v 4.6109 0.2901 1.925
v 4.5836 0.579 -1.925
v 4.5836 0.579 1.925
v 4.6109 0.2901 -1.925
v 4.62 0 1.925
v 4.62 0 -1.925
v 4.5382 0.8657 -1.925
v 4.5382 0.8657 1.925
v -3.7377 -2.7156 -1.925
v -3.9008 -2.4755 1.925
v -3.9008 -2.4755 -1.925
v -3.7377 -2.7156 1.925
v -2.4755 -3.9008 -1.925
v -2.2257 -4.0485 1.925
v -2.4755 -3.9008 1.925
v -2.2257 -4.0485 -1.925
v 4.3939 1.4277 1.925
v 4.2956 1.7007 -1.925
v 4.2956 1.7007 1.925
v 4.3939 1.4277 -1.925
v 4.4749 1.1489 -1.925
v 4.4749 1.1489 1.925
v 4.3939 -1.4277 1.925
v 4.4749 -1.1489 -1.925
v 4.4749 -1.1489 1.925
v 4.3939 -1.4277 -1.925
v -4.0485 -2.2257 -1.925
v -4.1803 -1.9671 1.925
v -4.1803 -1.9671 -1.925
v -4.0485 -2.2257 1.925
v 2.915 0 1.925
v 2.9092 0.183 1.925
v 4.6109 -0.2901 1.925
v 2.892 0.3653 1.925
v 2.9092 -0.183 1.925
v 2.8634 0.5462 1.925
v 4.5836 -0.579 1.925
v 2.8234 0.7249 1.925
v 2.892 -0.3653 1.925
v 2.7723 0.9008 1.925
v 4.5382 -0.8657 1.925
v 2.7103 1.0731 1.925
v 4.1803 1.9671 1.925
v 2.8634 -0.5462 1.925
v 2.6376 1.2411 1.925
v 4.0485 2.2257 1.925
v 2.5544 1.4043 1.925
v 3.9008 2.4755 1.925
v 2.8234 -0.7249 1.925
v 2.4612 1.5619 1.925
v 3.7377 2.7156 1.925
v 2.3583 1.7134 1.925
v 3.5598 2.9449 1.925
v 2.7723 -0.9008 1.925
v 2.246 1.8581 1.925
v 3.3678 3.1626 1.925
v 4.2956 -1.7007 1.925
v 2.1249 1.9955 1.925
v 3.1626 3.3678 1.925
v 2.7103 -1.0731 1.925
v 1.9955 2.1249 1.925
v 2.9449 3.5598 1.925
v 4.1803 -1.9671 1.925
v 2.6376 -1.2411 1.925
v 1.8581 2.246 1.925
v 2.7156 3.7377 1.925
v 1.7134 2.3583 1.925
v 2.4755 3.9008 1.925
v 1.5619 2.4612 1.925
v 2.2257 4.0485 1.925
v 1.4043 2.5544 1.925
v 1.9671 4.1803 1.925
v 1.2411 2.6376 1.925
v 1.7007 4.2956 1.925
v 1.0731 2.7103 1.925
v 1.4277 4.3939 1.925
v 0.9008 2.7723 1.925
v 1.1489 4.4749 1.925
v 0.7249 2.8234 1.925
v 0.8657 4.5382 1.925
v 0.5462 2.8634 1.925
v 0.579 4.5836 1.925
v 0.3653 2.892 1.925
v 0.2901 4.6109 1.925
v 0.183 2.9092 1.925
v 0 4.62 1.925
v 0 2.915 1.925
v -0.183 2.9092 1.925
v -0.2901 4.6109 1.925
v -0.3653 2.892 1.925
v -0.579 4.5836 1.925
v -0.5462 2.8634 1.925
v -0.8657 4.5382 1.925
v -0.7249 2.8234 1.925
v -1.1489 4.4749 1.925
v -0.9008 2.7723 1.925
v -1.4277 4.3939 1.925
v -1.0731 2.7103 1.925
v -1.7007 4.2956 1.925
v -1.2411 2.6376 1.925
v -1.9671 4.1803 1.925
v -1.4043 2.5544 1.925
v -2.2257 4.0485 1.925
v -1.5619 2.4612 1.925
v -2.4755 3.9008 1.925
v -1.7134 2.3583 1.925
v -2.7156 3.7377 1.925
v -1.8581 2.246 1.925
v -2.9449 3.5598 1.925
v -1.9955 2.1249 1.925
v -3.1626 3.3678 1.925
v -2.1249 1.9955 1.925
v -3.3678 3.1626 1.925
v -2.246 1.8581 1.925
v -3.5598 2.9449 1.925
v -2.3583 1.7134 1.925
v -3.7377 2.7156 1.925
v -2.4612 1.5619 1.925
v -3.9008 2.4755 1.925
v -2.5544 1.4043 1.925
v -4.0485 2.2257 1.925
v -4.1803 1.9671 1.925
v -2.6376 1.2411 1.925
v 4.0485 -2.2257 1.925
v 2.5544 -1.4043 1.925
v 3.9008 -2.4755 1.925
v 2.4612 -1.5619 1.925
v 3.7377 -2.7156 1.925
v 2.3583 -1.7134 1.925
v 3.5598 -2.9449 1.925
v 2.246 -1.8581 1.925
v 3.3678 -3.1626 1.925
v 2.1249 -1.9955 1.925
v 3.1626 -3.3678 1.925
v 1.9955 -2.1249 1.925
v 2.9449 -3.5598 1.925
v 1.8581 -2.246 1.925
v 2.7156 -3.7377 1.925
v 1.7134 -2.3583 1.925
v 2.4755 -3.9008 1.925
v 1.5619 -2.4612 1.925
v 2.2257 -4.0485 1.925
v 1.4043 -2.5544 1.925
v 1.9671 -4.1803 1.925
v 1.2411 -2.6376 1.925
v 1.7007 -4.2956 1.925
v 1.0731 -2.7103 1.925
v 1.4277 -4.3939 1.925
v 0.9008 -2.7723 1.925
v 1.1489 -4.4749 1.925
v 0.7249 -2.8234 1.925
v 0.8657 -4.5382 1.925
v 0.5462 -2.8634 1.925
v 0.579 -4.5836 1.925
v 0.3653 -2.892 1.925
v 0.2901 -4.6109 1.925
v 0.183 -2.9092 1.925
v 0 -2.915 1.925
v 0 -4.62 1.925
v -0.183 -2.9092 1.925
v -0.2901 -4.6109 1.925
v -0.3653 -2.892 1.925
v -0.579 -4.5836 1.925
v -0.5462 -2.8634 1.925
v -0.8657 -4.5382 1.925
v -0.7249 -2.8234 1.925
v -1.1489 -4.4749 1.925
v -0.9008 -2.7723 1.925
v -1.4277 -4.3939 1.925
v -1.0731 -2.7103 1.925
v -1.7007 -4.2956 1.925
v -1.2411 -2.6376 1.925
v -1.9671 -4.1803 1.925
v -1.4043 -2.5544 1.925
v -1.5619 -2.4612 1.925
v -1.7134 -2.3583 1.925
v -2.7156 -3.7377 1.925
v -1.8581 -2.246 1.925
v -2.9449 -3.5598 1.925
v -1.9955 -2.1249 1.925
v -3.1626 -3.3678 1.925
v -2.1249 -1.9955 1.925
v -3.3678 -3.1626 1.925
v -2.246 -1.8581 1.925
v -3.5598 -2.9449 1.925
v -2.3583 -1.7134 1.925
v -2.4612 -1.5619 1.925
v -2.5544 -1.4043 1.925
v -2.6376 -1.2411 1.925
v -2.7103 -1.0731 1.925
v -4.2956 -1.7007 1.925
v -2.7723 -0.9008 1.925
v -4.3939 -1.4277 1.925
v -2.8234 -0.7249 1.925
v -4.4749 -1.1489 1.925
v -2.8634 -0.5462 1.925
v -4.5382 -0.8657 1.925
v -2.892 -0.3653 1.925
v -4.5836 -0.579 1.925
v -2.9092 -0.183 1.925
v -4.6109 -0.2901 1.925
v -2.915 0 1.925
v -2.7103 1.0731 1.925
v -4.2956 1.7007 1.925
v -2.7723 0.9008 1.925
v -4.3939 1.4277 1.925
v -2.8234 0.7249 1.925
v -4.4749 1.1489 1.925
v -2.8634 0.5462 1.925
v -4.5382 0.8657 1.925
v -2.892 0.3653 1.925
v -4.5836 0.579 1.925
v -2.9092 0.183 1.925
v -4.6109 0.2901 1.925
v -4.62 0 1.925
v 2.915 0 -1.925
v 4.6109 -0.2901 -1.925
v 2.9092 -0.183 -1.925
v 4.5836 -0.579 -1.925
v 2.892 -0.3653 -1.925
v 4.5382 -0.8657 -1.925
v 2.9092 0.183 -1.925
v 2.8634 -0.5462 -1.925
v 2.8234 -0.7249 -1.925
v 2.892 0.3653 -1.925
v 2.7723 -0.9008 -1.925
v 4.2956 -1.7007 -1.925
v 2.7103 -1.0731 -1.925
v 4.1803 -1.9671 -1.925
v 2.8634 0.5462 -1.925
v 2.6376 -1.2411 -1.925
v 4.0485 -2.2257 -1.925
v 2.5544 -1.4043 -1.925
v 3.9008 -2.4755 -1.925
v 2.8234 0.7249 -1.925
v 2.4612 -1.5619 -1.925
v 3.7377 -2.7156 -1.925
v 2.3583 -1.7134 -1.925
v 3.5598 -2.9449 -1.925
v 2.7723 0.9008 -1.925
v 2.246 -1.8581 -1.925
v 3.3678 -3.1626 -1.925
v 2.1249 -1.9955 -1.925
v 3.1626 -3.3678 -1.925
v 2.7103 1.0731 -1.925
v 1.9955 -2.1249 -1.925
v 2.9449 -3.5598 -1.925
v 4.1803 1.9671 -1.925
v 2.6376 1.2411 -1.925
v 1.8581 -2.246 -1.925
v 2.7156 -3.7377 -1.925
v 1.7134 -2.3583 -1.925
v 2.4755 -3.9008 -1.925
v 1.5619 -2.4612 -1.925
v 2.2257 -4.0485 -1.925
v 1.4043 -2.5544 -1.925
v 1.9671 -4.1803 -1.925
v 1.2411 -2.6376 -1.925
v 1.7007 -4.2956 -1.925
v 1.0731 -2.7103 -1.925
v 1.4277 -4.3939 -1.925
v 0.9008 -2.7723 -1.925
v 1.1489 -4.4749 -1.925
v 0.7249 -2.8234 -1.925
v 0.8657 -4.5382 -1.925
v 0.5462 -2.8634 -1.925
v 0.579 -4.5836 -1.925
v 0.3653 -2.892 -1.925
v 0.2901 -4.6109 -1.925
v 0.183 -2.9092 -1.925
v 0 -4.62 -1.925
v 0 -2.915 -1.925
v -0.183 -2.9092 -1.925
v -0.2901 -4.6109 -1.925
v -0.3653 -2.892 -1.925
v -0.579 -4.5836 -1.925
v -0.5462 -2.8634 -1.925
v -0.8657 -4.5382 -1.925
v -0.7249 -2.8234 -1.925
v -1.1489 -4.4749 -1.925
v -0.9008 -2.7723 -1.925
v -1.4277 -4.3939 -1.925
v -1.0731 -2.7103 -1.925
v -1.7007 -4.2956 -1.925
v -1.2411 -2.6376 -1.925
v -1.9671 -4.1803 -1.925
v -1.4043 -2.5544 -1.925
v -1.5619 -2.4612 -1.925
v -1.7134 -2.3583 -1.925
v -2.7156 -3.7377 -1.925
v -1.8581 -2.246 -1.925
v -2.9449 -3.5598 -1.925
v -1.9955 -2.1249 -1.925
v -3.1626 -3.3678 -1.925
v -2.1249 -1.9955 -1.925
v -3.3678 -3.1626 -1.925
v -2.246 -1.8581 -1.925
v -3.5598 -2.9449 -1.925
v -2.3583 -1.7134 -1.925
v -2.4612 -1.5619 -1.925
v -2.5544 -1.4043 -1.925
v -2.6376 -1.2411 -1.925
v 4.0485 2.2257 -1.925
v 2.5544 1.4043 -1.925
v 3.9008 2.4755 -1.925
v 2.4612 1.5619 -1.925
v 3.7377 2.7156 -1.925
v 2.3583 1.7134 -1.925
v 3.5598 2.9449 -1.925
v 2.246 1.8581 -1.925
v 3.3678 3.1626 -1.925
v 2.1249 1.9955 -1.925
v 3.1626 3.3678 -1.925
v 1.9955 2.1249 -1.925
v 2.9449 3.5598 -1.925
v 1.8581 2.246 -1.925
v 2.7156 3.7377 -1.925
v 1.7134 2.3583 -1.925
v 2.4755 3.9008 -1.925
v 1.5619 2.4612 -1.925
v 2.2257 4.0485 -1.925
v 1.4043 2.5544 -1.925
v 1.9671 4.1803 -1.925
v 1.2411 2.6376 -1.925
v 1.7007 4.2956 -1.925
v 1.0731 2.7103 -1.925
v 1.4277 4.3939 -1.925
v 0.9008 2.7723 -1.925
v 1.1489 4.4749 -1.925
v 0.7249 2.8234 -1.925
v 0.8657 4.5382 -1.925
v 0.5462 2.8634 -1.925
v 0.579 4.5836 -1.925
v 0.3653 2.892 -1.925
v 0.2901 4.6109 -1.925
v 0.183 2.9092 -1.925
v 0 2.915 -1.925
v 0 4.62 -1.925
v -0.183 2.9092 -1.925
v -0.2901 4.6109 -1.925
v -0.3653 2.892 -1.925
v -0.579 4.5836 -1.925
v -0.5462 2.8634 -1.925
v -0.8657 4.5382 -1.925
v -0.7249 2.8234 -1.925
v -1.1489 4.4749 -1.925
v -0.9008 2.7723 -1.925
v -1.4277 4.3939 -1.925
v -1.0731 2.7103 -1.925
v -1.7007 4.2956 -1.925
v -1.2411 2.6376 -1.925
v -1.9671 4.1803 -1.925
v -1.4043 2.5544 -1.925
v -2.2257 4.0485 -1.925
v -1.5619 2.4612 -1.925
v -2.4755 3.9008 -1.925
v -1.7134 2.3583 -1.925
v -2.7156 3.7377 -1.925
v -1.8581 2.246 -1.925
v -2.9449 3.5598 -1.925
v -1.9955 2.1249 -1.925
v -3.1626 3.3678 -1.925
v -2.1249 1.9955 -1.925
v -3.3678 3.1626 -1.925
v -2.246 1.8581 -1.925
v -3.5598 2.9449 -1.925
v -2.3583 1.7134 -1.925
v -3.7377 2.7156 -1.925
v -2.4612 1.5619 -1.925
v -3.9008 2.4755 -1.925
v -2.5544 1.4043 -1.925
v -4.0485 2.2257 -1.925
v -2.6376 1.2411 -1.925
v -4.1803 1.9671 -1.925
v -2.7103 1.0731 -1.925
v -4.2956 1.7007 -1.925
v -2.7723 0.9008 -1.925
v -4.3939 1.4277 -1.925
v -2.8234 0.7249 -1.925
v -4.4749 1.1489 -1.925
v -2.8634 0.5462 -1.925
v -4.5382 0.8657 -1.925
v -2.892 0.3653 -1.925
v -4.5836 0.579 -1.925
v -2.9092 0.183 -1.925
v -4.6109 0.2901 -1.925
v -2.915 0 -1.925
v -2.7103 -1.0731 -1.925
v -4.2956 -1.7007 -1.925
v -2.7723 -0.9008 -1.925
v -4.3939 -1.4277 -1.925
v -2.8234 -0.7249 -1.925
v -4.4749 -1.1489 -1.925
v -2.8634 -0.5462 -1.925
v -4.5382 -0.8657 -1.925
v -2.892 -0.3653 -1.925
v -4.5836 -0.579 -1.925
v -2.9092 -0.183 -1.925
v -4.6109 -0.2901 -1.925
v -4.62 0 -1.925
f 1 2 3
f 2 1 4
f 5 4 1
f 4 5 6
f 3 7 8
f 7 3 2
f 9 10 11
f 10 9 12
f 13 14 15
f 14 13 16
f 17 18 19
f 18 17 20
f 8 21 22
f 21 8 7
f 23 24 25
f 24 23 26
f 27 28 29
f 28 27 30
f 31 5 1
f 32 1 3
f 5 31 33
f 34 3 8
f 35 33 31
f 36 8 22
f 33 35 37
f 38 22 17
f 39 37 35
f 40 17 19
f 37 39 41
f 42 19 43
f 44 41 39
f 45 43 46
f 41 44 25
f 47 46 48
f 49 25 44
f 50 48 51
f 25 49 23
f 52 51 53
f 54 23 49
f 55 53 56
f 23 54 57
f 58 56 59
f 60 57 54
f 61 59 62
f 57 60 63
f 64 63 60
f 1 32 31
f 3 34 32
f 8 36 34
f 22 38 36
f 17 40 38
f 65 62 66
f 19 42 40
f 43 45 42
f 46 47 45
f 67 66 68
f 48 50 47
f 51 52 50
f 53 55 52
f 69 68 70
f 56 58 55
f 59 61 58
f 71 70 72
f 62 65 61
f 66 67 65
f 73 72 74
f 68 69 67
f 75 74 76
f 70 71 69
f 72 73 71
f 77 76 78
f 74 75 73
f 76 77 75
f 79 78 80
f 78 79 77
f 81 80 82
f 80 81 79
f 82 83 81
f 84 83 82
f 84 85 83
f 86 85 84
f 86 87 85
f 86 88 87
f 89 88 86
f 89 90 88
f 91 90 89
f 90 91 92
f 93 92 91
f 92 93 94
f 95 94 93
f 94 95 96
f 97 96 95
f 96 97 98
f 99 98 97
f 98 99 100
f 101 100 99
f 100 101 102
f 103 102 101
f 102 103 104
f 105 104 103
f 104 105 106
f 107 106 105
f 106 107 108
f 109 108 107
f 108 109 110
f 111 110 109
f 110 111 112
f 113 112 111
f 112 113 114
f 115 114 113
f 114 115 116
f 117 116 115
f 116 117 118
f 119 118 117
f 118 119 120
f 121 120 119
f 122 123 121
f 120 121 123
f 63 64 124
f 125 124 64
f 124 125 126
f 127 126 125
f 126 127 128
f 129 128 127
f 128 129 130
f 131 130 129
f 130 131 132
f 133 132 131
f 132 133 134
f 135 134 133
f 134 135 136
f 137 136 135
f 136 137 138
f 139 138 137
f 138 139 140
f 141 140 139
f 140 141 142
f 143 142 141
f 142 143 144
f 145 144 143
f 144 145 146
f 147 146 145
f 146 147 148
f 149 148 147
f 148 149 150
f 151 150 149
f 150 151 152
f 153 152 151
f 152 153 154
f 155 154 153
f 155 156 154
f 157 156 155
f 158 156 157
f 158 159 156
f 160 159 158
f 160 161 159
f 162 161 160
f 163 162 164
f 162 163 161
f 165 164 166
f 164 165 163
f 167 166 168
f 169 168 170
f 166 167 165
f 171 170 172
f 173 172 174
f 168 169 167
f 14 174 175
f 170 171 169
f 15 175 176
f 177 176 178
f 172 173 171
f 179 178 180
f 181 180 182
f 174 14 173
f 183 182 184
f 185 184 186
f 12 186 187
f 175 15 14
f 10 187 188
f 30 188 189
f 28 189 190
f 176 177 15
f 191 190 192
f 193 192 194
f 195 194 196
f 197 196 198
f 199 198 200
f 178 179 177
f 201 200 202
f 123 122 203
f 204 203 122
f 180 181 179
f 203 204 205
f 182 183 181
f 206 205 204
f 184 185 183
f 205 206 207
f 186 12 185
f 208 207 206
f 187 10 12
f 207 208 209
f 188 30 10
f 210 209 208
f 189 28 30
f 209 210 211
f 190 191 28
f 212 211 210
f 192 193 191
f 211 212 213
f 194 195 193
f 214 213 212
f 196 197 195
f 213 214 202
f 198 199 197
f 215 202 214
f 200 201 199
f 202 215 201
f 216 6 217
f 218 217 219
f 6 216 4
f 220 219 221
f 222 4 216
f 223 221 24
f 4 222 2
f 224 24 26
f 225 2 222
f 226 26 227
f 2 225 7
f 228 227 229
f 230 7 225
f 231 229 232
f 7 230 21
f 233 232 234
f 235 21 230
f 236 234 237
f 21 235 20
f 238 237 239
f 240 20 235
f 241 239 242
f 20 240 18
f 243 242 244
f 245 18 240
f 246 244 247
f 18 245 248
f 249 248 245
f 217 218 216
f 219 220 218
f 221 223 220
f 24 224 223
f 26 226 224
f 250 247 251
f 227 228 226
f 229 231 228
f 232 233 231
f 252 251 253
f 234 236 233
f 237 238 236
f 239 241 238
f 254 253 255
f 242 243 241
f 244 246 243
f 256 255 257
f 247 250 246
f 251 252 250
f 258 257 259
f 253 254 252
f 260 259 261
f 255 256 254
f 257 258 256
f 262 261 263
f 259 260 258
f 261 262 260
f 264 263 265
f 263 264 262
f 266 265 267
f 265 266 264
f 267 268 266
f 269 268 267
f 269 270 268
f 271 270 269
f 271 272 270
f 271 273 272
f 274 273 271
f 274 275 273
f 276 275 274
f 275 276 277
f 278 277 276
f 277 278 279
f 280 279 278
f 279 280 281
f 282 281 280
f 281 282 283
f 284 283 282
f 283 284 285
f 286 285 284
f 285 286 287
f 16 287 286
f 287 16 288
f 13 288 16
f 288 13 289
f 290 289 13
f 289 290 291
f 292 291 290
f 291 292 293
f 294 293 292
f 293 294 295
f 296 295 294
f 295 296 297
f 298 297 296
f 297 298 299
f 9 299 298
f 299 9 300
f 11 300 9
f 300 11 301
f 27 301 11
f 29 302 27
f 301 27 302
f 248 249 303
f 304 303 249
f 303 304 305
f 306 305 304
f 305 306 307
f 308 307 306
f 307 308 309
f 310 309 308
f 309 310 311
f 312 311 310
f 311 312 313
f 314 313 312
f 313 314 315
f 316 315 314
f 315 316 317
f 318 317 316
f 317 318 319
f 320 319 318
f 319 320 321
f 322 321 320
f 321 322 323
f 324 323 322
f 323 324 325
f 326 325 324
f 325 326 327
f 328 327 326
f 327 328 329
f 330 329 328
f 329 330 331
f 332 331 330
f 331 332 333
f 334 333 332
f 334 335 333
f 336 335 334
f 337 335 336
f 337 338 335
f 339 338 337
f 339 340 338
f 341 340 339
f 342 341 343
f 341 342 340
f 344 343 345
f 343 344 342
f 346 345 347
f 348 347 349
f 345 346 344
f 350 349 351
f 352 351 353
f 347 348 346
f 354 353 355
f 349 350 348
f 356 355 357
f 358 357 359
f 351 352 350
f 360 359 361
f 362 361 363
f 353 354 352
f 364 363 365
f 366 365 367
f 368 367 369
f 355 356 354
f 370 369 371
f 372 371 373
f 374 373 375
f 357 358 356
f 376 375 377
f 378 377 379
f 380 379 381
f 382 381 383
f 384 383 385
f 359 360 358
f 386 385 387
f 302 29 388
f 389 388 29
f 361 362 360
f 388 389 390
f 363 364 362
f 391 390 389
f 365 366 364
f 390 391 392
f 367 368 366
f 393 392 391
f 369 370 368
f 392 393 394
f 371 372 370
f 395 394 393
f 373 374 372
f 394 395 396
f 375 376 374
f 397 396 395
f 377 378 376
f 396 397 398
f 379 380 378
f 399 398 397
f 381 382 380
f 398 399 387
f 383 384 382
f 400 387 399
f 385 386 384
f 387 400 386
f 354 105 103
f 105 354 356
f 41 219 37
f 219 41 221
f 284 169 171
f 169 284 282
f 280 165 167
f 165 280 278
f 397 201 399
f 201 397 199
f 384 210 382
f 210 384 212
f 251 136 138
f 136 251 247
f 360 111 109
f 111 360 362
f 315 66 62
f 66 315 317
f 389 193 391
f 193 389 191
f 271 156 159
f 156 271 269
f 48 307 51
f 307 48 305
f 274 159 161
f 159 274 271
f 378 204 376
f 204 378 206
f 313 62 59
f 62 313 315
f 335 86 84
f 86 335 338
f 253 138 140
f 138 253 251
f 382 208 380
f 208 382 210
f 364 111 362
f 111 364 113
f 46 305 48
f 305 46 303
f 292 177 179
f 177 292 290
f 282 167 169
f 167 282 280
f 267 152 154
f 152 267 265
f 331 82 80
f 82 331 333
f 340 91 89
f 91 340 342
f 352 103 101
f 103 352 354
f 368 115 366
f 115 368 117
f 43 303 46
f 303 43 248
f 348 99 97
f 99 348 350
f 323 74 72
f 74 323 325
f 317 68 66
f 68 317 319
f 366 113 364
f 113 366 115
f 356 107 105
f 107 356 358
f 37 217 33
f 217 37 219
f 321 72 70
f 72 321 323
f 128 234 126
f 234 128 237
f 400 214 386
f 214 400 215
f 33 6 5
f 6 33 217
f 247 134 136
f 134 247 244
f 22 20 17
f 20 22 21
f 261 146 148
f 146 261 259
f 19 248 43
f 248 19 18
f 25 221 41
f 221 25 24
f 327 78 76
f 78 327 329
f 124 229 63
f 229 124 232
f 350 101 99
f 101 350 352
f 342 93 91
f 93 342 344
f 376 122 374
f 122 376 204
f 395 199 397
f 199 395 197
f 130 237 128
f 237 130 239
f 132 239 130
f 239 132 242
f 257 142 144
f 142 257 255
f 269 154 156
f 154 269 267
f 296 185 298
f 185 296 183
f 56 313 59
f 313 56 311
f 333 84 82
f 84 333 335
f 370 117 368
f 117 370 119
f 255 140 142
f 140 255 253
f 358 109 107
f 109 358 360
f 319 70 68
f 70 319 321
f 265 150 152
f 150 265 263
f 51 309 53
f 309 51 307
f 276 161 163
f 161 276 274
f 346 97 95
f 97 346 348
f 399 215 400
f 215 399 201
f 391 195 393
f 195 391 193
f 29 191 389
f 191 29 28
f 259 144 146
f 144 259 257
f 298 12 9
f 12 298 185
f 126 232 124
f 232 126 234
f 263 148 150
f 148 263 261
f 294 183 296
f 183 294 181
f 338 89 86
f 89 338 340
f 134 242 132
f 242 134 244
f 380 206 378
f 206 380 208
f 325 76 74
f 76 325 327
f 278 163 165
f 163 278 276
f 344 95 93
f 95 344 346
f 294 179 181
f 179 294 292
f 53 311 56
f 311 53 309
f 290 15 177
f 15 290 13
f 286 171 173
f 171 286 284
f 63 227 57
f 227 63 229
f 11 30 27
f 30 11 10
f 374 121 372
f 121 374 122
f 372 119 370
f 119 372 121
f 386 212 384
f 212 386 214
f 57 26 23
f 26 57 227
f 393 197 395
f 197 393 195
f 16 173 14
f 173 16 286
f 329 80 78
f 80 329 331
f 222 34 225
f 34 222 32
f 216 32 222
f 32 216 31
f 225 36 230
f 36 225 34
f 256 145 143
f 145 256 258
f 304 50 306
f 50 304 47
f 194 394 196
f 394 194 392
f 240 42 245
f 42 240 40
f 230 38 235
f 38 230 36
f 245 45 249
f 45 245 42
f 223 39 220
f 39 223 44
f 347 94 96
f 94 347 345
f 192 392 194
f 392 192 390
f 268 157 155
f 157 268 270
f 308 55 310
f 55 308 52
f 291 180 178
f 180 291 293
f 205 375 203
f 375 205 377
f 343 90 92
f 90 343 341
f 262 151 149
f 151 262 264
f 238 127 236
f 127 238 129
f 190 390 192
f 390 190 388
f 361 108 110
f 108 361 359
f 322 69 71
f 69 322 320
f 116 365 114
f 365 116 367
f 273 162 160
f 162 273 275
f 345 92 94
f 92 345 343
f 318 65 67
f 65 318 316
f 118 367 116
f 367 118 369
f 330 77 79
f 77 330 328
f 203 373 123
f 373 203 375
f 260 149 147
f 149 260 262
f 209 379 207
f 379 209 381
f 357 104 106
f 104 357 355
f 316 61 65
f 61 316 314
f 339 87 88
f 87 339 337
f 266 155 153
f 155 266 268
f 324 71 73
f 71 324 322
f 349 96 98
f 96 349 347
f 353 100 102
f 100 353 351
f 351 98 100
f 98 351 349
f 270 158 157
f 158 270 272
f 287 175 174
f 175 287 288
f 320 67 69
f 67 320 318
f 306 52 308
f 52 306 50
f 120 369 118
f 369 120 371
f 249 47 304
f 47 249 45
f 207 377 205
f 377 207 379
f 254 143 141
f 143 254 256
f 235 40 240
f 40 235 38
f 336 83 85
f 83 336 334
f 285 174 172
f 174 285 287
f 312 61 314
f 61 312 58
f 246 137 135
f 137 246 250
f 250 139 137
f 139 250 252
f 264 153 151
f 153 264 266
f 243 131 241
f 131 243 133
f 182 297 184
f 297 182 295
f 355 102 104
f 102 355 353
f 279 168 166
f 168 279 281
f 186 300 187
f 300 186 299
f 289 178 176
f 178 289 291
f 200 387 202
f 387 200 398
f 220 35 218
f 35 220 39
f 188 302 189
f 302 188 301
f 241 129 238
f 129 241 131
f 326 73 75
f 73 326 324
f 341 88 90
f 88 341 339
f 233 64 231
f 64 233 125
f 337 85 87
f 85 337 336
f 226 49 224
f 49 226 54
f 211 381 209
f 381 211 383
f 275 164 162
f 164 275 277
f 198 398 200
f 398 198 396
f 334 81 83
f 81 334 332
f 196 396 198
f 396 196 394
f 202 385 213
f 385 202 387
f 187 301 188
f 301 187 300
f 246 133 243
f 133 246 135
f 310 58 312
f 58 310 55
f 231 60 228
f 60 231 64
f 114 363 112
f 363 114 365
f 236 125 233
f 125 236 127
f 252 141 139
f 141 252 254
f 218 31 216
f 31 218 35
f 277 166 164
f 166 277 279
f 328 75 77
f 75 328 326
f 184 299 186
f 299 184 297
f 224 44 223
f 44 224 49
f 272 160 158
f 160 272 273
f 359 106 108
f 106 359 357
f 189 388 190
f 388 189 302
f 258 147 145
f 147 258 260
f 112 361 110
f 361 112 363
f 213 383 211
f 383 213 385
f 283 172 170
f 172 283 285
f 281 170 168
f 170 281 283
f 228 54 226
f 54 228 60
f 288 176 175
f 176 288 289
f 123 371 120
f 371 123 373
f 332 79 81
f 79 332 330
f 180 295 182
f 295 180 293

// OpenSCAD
 //in milimeters
/*
translate([0,47,0]) cube([76,28,3]);//podlozka
difference(){
    translate([0,45,0])cube([40,32,26]); //hlavni kostka
    translate([20,60,72]) rotate ([90,0,0]) cylinder (h = 40, r=50, center = true, $fn=100); //vyrezavaci cylinder
}
*/
expansion=110; //percent
percentage=expansion/100;
height=3.5;
translate([0,0,0]){
difference(){
//vnejsi trubka
cylinder(h=height*percentage,r=(8.4/2)*percentage,center=true,$fn=100);
//vnitrni trubka odectena
cylinder(h=(height+3)*percentage,r=(5.3/2)*percentage,center=true,$fn=100);
}
}
